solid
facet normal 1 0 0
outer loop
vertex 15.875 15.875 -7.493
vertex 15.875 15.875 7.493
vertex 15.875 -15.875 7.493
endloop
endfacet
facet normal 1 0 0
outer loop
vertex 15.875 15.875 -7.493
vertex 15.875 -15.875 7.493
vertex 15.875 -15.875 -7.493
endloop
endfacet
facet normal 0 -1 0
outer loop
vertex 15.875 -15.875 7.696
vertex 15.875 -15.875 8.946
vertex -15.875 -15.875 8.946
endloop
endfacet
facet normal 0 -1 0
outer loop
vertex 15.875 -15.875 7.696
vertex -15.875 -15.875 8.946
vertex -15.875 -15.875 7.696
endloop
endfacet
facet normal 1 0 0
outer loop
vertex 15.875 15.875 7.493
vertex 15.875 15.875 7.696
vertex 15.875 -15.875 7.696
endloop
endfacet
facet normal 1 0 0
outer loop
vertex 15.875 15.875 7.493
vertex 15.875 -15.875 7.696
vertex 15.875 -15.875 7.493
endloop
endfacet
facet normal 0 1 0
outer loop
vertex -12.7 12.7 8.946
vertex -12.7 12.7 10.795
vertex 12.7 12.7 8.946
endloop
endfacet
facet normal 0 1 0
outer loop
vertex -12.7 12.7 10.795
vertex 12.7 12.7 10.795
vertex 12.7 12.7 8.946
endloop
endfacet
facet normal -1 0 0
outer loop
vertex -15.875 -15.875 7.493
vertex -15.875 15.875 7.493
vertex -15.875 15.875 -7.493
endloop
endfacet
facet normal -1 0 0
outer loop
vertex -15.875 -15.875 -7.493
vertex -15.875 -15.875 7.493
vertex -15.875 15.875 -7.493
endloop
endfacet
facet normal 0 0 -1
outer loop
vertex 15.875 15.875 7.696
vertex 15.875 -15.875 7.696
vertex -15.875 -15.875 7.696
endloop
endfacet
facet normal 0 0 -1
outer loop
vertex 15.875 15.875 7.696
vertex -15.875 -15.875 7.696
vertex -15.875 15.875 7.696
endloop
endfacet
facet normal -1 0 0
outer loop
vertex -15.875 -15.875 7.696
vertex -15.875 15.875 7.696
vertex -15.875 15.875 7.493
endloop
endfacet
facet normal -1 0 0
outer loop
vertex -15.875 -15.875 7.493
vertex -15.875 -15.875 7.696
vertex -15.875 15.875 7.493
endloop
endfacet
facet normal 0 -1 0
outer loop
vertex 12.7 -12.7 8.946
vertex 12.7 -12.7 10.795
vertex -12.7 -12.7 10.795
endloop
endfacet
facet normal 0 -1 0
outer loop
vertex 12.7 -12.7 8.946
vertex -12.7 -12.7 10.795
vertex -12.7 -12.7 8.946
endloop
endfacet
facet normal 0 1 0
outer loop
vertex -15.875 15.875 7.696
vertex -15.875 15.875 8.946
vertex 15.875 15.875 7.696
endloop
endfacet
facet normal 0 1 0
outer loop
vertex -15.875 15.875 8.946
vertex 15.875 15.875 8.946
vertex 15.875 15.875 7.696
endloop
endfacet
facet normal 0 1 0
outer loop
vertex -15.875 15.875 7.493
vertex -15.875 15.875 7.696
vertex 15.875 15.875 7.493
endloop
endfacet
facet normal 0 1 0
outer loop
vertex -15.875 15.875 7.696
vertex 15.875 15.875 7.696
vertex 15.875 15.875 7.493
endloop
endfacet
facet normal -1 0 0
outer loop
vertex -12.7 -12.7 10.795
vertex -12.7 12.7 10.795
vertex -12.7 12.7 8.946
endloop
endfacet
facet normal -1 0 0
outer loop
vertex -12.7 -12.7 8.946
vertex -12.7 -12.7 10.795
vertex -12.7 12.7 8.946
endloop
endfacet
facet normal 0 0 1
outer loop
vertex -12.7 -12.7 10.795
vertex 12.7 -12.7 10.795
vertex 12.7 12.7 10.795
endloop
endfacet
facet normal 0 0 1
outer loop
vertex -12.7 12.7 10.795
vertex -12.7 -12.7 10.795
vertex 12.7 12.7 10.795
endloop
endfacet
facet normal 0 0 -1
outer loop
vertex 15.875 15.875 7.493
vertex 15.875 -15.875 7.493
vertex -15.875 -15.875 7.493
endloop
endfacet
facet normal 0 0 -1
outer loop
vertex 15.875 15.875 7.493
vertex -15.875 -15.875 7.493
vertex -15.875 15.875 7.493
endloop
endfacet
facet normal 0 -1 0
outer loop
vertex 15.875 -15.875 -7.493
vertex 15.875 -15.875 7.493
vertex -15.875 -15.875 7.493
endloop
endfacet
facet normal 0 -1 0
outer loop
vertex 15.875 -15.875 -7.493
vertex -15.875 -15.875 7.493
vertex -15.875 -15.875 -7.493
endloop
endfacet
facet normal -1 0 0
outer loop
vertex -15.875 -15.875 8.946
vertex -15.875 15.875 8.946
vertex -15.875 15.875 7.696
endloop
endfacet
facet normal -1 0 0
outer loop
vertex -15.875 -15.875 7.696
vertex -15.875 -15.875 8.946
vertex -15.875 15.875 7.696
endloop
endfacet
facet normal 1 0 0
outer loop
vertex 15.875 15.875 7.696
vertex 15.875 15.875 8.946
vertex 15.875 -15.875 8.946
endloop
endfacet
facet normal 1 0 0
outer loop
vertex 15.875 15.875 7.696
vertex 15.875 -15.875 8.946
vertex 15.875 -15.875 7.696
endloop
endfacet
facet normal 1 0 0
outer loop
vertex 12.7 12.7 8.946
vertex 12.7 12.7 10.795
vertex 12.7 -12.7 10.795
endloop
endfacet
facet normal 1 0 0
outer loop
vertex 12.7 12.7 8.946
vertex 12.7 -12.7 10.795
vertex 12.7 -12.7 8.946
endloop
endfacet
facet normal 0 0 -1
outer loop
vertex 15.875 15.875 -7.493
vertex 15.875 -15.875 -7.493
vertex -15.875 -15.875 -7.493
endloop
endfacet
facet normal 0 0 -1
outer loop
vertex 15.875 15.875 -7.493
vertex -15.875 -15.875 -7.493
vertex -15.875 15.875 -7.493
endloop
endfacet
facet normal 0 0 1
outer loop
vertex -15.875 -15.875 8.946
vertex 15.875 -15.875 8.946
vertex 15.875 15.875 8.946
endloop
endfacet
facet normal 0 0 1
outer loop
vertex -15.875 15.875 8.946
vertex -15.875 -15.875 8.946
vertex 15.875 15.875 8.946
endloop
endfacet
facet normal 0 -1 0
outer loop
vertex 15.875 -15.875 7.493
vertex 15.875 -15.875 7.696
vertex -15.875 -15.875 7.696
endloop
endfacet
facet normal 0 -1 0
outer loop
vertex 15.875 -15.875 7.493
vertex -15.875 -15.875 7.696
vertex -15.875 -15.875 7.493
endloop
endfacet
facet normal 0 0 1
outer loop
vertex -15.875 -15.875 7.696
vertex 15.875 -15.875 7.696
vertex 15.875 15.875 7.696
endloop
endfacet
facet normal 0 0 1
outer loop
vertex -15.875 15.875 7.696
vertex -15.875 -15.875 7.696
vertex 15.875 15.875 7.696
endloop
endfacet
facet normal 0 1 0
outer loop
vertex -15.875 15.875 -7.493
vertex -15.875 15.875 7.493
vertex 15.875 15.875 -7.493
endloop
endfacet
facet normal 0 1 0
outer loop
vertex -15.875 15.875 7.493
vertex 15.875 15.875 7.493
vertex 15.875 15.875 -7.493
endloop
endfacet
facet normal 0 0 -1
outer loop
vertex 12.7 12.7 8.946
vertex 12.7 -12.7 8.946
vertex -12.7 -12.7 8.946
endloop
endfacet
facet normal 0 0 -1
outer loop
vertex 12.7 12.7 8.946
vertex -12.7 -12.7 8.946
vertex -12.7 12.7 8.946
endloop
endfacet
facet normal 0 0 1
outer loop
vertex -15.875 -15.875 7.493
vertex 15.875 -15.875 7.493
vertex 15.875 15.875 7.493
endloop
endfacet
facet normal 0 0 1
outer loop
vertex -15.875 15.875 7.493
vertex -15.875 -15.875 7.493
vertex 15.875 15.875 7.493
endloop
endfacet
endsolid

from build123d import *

# Parameters (mm, degrees)
SKETCH1_W           = 14.986
SKETCH1_H           = 31.75
BOSS_EXTRUDE1_DEPTH = 15.875
BOSS_EXTRUDE2_DEPTH = 15.875
SKETCH1_6_W         = 0.2032
SKETCH1_6_H         = 31.75
BOSS_EXTRUDE4_DEPTH = 15.875
SKETCH1_7_W         = 1.8488
SKETCH1_7_H         = 25.4
BOSS_EXTRUDE5_DEPTH = 12.7


with BuildPart() as part:
    # Sketch1 → Boss-Extrude1 (new, symmetric)
    with BuildSketch(Plane(origin=(0, 0, 0), x_dir=(0, 0, -1), z_dir=(1, 0, 0))):
        Rectangle(SKETCH1_W, SKETCH1_H)
    extrude(amount=BOSS_EXTRUDE1_DEPTH, both=True)


with BuildPart() as body_2:
    # Sketch1<3> → Boss-Extrude2 (new, symmetric)
    with BuildSketch(Plane(origin=(0, 0, 0), x_dir=(0, 0, -1), z_dir=(1, 0, 0))):
        Polygon((-7.6962, -15.875), (-7.6962, 15.875), (-8.9462, 15.875), (-8.9462, 12.7), (-8.9462, -12.7), (-8.9462, -15.875), align=None)
    extrude(amount=BOSS_EXTRUDE2_DEPTH, both=True)


with BuildPart() as body_3:
    # Sketch1<6> → Boss-Extrude4 (new, symmetric)
    with BuildSketch(Plane(origin=(0, 0, 0), x_dir=(0, 0, -1), z_dir=(1, 0, 0))):
        with Locations((-7.5946, 0)):
            Rectangle(SKETCH1_6_W, SKETCH1_6_H)
    extrude(amount=BOSS_EXTRUDE4_DEPTH, both=True)


with BuildPart() as body_4:
    # Sketch1<7> → Boss-Extrude5 (new, symmetric)
    with BuildSketch(Plane(origin=(0, 0, 0), x_dir=(0, 0, -1), z_dir=(1, 0, 0))):
        with Locations((-9.8706, 0)):
            Rectangle(SKETCH1_7_W, SKETCH1_7_H)
    extrude(amount=BOSS_EXTRUDE5_DEPTH, both=True)


solid = Compound([part.part, body_2.part, body_3.part, body_4.part])
